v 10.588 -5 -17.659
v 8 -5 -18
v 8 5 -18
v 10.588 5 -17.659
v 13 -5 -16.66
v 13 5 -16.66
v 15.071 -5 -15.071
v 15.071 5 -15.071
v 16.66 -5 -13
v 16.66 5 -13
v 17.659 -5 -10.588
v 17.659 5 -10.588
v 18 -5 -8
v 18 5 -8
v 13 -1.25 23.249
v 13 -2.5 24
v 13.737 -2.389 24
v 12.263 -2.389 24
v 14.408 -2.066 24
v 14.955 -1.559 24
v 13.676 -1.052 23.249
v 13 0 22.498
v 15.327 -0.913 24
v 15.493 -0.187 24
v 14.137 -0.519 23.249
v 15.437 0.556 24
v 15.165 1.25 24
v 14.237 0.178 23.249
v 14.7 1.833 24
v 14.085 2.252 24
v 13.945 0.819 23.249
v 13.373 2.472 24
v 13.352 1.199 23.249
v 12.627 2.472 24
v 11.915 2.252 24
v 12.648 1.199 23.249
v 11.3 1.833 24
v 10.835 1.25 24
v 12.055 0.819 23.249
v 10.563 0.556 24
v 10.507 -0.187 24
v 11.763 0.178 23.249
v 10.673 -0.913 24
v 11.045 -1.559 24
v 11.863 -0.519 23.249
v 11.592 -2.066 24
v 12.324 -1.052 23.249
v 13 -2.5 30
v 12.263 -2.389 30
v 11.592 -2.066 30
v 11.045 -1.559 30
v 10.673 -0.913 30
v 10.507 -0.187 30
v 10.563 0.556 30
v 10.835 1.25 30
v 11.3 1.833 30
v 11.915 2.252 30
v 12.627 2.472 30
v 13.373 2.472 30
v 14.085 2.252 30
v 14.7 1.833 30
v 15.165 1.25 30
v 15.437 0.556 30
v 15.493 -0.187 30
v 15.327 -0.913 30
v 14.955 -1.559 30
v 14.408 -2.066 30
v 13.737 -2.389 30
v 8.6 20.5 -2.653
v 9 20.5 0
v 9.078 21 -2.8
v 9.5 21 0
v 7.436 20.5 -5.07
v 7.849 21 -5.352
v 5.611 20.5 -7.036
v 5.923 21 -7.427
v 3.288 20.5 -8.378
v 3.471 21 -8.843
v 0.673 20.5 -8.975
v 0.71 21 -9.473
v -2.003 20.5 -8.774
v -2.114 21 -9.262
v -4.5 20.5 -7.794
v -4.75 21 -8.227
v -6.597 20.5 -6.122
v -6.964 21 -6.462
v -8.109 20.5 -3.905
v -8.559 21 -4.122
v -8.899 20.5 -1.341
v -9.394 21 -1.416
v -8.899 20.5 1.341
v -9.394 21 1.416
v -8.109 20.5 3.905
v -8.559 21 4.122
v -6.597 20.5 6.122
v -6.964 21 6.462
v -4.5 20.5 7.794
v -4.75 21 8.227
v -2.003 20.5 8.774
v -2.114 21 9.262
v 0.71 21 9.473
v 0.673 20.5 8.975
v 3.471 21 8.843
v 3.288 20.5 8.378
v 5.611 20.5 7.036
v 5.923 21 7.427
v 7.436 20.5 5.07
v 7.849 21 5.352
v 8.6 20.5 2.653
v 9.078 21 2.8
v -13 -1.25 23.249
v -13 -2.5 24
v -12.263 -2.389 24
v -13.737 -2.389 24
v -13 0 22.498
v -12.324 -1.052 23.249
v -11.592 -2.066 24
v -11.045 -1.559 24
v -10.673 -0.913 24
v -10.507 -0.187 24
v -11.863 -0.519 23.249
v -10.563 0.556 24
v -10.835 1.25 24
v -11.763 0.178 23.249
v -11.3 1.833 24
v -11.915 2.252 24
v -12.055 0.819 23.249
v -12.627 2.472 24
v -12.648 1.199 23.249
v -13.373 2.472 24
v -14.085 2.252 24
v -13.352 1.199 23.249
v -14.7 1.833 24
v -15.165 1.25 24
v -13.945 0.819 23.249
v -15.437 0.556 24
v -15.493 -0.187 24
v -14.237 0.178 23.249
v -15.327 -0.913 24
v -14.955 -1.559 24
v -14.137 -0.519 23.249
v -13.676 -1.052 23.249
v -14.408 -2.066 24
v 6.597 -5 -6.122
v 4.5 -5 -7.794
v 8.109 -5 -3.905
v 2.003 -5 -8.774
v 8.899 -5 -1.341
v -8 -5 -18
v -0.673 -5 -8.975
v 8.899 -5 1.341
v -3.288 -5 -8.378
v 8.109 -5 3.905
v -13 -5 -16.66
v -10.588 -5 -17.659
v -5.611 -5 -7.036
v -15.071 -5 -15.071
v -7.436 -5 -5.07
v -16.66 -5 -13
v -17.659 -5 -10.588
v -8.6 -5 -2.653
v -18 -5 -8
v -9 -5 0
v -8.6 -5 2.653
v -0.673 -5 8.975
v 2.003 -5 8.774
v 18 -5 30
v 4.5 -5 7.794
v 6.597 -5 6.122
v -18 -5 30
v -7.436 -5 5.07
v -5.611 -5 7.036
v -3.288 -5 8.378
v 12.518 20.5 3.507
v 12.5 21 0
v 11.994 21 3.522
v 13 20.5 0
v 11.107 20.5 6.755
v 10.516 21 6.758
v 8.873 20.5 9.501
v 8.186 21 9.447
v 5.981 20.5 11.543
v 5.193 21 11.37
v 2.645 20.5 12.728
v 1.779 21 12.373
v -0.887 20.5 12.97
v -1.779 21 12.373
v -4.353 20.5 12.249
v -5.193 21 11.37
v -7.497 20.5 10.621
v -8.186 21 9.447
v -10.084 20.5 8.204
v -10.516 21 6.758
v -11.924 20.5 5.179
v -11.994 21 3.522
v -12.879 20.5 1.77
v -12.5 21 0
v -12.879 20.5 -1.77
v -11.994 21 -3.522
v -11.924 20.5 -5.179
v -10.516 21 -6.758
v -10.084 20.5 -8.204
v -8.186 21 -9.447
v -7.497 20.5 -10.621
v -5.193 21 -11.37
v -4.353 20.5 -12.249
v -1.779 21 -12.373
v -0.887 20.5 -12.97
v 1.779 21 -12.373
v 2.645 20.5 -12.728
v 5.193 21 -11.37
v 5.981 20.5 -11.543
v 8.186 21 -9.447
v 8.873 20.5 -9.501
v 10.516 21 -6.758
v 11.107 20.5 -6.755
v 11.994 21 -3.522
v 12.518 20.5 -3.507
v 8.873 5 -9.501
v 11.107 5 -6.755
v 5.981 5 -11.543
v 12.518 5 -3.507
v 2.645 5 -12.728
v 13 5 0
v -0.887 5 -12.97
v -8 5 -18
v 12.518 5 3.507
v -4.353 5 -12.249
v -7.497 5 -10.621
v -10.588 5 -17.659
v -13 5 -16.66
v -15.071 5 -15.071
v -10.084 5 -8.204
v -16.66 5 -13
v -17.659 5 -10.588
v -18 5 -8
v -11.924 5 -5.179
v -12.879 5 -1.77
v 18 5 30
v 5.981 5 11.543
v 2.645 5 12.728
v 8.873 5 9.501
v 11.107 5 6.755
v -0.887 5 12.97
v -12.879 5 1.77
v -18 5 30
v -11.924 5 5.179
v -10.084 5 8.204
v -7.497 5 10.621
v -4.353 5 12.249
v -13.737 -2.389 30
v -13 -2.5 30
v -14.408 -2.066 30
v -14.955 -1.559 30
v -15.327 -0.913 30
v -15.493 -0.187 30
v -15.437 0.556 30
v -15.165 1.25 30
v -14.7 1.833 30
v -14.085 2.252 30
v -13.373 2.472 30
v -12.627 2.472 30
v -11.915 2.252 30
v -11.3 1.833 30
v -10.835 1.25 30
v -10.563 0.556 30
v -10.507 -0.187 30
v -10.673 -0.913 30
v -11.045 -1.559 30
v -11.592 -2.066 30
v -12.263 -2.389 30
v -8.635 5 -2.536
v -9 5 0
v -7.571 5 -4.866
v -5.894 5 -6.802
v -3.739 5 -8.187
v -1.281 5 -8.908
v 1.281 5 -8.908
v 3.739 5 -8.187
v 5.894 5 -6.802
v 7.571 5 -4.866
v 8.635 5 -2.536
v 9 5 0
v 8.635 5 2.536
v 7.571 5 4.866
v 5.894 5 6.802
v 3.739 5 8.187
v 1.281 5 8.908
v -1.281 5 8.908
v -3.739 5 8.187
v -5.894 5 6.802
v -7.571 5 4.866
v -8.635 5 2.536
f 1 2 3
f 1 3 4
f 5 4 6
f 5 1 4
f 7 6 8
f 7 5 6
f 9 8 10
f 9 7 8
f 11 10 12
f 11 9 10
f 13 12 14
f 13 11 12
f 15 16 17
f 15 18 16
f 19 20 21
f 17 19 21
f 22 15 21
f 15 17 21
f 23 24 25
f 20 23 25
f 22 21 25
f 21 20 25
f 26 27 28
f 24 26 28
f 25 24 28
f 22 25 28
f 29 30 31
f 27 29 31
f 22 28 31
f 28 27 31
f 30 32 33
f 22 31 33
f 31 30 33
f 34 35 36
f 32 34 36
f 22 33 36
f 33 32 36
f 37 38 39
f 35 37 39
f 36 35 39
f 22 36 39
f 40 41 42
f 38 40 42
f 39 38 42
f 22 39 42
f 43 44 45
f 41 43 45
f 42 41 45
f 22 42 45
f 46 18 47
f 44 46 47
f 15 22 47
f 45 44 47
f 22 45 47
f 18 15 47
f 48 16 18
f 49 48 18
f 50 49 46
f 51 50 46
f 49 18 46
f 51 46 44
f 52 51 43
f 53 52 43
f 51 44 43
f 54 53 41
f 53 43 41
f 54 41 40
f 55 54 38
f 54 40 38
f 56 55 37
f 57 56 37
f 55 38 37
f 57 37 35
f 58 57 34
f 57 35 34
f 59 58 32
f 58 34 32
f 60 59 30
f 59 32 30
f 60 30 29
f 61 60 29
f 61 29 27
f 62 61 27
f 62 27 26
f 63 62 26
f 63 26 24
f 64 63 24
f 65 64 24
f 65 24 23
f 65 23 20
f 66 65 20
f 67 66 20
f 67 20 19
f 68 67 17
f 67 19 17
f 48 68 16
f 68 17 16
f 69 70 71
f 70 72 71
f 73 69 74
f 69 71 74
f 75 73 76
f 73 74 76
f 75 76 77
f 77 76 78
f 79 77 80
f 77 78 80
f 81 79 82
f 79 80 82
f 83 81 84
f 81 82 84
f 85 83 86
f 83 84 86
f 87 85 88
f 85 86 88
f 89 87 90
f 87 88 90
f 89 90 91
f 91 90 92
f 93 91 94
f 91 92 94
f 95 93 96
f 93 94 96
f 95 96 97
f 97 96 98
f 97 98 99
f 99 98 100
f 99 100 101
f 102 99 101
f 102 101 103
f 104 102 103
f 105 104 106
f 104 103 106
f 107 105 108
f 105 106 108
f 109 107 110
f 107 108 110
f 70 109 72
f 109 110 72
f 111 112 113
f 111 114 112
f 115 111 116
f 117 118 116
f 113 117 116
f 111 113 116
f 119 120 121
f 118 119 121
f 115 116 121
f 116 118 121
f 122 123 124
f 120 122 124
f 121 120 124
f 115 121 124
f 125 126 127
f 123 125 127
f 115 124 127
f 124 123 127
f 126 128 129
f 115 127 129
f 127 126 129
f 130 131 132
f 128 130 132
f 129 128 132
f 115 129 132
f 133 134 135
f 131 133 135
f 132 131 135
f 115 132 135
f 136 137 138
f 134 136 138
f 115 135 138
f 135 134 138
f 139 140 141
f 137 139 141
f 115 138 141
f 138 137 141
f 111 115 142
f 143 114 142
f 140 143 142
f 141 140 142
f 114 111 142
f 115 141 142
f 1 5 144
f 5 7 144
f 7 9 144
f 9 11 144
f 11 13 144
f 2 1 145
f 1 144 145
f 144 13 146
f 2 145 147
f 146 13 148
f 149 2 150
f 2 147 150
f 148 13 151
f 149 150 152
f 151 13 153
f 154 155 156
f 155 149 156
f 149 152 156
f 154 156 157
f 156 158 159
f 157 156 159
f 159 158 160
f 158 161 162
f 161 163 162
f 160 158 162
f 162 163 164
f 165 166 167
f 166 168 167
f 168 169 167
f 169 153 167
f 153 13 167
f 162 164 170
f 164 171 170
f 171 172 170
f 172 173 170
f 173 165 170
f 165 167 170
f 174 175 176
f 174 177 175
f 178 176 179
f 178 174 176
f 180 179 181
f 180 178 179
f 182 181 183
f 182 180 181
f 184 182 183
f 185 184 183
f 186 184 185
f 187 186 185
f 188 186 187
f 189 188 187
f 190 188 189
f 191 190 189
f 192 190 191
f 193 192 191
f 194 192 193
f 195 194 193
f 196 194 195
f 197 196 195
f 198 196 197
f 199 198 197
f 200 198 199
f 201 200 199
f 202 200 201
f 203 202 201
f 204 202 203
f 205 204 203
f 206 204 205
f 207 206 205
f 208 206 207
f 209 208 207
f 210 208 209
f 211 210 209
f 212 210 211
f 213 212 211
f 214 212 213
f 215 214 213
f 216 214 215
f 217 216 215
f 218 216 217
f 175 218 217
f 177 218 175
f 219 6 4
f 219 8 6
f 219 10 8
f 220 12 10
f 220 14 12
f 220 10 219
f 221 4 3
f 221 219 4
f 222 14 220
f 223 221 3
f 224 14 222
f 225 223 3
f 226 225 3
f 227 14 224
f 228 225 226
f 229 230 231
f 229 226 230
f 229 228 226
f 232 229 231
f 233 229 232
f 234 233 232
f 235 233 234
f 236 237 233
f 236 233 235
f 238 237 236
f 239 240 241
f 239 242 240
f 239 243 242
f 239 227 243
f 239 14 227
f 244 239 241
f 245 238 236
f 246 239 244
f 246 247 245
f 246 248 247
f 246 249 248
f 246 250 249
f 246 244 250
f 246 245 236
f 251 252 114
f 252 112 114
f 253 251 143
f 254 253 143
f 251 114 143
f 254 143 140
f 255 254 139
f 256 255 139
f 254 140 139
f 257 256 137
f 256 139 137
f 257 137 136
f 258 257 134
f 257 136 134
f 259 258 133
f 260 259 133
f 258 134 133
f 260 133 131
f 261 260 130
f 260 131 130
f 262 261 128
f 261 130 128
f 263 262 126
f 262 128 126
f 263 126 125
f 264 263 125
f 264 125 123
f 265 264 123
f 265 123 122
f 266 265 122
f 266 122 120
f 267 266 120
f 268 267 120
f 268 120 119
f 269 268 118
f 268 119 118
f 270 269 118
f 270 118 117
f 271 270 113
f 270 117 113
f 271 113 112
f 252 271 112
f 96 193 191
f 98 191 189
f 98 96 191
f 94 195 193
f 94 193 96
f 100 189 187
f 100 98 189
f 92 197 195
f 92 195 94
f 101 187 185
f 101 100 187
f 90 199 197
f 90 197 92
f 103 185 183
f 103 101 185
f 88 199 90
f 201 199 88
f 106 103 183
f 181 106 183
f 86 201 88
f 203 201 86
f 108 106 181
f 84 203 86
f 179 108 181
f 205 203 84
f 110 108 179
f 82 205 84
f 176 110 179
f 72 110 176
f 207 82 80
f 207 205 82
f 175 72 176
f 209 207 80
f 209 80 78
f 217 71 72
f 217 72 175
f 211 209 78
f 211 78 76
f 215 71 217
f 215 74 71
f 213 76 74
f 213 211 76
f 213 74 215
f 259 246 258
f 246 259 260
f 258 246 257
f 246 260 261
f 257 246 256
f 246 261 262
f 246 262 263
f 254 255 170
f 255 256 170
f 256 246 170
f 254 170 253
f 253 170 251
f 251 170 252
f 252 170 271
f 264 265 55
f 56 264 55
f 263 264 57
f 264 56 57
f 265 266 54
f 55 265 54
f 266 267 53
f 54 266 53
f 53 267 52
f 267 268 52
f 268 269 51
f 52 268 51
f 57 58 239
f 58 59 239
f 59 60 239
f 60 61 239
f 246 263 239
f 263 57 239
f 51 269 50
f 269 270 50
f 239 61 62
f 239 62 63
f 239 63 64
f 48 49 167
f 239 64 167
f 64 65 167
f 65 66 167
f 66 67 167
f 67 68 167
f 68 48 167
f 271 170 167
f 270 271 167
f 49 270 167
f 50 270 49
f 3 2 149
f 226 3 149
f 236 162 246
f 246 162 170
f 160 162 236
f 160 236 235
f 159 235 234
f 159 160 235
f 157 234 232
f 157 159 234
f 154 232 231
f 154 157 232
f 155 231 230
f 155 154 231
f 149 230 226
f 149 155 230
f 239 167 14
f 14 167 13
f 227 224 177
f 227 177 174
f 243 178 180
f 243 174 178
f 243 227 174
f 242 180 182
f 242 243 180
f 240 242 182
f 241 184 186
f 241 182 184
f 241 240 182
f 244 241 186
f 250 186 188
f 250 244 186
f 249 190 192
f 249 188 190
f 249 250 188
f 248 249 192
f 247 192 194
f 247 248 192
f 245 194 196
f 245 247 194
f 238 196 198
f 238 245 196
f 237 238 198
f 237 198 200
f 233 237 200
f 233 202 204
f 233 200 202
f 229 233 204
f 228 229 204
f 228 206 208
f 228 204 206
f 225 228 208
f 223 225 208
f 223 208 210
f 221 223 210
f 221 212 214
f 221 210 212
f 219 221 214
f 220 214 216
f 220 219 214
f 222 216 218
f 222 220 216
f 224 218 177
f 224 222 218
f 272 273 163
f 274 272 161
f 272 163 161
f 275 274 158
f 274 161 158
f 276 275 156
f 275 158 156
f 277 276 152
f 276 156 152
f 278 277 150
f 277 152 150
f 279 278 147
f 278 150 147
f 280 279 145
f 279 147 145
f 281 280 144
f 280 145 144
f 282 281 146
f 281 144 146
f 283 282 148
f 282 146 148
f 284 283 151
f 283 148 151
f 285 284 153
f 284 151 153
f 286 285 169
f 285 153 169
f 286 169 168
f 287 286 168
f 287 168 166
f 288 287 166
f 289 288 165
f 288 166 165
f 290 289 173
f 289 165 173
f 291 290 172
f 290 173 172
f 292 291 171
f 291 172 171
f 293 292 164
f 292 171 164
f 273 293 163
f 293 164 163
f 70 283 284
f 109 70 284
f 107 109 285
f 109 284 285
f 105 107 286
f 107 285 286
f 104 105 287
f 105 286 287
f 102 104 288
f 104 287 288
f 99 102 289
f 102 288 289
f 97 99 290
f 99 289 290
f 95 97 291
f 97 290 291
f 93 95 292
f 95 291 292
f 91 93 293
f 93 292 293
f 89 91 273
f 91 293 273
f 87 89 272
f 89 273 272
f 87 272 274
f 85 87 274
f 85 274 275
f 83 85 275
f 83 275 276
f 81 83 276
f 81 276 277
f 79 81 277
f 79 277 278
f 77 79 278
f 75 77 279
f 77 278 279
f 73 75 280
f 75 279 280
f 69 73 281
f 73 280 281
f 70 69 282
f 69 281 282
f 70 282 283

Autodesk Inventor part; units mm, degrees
ref_plane "YZ Plane" through (0, 0, 0) normal (1, 0, 0) x (0, 1, 0)
ref_plane "XZ Plane" through (0, 0, 0) normal (0, 1, 0) x (-1, 0, 0)
ref_plane "XY Plane" through (0, 0, 0) normal (0, 0, 1) x (1, 0, 0)
sketch "スケッチ1" plane through (0, 0, 0) normal (0, 1, 0) x (-1, 0, 0)
  circle A0 centre (0, 0) radius 9
  line L0 (18, 10) -> (-18, 10)
  line L1 (-18, 10) -> (-18, -18)
  line L2 (-18, -18) -> (18, -18)
  line L3 (18, -18) -> (18, 10)
  line L4 (18, 30) -> (-18, 30)
  line L5 (-18, 30) -> (-18, 10)
  line L6 (-18, 10) -> (18, 10)
  line L7 (18, 10) -> (18, 30)
  line L8 (18, 30) -> (-18, 10) construction
  line L9 (-18, 30) -> (18, 10) construction
  point P0 (0, 20)
  point P1 (0, 20)
  point P2 (20, 10)
  point P3 (-6.6332, 10)
  point P4 (6.6332, 10)
  dimension "d0" = 18
  dimension "d18" = 10
  dimension "d33" = 30
  dimension "d34" = 36
  dimension "d36" = 18
extrude "押し出し1" add sketch "スケッチ1" along normal mid plane 10
sketch "スケッチ2" plane through (-38, 5, 30) normal (0, 0, 1) x (1, 0, 0)
  line L0 (20, -10) -> (20, 0) projected
  line L1 (56, -10) -> (20, -10) projected
  line L2 (56, 0) -> (56, -10) projected
  point P0 (38, -5)
  point P1 (25, -5)
  point P2 (51, -5)
  dimension "d37" = 5
  dimension "d38" = 5
  dimension "d39" = 5
hole "穴1" at (-13, 0, 30) at (13, 0, 30) direction (0, 0, -1) diameter 5 depth 6 tip angle 118
fillet "フィレット1" radius 10 2 edges at (18, 0, -18) (-18, 0, -18)
sketch "スケッチ4" plane through (0, 5, 0) normal (0, 1, 0) x (1, 0, 0)
  circle A0 centre (0, 0) radius 13
  circle A1 centre (0, 0) radius 9 projected
  dimension "d43" = 26
extrude "押し出し3" add sketch "スケッチ4" along normal blind 16
chamfer "面取り3" distance 0.5 angle 45 2 edges at (-9, 21, 0) (-13, 21, 0)
properties part number "cable_holder" material "ABS プラスチック"
